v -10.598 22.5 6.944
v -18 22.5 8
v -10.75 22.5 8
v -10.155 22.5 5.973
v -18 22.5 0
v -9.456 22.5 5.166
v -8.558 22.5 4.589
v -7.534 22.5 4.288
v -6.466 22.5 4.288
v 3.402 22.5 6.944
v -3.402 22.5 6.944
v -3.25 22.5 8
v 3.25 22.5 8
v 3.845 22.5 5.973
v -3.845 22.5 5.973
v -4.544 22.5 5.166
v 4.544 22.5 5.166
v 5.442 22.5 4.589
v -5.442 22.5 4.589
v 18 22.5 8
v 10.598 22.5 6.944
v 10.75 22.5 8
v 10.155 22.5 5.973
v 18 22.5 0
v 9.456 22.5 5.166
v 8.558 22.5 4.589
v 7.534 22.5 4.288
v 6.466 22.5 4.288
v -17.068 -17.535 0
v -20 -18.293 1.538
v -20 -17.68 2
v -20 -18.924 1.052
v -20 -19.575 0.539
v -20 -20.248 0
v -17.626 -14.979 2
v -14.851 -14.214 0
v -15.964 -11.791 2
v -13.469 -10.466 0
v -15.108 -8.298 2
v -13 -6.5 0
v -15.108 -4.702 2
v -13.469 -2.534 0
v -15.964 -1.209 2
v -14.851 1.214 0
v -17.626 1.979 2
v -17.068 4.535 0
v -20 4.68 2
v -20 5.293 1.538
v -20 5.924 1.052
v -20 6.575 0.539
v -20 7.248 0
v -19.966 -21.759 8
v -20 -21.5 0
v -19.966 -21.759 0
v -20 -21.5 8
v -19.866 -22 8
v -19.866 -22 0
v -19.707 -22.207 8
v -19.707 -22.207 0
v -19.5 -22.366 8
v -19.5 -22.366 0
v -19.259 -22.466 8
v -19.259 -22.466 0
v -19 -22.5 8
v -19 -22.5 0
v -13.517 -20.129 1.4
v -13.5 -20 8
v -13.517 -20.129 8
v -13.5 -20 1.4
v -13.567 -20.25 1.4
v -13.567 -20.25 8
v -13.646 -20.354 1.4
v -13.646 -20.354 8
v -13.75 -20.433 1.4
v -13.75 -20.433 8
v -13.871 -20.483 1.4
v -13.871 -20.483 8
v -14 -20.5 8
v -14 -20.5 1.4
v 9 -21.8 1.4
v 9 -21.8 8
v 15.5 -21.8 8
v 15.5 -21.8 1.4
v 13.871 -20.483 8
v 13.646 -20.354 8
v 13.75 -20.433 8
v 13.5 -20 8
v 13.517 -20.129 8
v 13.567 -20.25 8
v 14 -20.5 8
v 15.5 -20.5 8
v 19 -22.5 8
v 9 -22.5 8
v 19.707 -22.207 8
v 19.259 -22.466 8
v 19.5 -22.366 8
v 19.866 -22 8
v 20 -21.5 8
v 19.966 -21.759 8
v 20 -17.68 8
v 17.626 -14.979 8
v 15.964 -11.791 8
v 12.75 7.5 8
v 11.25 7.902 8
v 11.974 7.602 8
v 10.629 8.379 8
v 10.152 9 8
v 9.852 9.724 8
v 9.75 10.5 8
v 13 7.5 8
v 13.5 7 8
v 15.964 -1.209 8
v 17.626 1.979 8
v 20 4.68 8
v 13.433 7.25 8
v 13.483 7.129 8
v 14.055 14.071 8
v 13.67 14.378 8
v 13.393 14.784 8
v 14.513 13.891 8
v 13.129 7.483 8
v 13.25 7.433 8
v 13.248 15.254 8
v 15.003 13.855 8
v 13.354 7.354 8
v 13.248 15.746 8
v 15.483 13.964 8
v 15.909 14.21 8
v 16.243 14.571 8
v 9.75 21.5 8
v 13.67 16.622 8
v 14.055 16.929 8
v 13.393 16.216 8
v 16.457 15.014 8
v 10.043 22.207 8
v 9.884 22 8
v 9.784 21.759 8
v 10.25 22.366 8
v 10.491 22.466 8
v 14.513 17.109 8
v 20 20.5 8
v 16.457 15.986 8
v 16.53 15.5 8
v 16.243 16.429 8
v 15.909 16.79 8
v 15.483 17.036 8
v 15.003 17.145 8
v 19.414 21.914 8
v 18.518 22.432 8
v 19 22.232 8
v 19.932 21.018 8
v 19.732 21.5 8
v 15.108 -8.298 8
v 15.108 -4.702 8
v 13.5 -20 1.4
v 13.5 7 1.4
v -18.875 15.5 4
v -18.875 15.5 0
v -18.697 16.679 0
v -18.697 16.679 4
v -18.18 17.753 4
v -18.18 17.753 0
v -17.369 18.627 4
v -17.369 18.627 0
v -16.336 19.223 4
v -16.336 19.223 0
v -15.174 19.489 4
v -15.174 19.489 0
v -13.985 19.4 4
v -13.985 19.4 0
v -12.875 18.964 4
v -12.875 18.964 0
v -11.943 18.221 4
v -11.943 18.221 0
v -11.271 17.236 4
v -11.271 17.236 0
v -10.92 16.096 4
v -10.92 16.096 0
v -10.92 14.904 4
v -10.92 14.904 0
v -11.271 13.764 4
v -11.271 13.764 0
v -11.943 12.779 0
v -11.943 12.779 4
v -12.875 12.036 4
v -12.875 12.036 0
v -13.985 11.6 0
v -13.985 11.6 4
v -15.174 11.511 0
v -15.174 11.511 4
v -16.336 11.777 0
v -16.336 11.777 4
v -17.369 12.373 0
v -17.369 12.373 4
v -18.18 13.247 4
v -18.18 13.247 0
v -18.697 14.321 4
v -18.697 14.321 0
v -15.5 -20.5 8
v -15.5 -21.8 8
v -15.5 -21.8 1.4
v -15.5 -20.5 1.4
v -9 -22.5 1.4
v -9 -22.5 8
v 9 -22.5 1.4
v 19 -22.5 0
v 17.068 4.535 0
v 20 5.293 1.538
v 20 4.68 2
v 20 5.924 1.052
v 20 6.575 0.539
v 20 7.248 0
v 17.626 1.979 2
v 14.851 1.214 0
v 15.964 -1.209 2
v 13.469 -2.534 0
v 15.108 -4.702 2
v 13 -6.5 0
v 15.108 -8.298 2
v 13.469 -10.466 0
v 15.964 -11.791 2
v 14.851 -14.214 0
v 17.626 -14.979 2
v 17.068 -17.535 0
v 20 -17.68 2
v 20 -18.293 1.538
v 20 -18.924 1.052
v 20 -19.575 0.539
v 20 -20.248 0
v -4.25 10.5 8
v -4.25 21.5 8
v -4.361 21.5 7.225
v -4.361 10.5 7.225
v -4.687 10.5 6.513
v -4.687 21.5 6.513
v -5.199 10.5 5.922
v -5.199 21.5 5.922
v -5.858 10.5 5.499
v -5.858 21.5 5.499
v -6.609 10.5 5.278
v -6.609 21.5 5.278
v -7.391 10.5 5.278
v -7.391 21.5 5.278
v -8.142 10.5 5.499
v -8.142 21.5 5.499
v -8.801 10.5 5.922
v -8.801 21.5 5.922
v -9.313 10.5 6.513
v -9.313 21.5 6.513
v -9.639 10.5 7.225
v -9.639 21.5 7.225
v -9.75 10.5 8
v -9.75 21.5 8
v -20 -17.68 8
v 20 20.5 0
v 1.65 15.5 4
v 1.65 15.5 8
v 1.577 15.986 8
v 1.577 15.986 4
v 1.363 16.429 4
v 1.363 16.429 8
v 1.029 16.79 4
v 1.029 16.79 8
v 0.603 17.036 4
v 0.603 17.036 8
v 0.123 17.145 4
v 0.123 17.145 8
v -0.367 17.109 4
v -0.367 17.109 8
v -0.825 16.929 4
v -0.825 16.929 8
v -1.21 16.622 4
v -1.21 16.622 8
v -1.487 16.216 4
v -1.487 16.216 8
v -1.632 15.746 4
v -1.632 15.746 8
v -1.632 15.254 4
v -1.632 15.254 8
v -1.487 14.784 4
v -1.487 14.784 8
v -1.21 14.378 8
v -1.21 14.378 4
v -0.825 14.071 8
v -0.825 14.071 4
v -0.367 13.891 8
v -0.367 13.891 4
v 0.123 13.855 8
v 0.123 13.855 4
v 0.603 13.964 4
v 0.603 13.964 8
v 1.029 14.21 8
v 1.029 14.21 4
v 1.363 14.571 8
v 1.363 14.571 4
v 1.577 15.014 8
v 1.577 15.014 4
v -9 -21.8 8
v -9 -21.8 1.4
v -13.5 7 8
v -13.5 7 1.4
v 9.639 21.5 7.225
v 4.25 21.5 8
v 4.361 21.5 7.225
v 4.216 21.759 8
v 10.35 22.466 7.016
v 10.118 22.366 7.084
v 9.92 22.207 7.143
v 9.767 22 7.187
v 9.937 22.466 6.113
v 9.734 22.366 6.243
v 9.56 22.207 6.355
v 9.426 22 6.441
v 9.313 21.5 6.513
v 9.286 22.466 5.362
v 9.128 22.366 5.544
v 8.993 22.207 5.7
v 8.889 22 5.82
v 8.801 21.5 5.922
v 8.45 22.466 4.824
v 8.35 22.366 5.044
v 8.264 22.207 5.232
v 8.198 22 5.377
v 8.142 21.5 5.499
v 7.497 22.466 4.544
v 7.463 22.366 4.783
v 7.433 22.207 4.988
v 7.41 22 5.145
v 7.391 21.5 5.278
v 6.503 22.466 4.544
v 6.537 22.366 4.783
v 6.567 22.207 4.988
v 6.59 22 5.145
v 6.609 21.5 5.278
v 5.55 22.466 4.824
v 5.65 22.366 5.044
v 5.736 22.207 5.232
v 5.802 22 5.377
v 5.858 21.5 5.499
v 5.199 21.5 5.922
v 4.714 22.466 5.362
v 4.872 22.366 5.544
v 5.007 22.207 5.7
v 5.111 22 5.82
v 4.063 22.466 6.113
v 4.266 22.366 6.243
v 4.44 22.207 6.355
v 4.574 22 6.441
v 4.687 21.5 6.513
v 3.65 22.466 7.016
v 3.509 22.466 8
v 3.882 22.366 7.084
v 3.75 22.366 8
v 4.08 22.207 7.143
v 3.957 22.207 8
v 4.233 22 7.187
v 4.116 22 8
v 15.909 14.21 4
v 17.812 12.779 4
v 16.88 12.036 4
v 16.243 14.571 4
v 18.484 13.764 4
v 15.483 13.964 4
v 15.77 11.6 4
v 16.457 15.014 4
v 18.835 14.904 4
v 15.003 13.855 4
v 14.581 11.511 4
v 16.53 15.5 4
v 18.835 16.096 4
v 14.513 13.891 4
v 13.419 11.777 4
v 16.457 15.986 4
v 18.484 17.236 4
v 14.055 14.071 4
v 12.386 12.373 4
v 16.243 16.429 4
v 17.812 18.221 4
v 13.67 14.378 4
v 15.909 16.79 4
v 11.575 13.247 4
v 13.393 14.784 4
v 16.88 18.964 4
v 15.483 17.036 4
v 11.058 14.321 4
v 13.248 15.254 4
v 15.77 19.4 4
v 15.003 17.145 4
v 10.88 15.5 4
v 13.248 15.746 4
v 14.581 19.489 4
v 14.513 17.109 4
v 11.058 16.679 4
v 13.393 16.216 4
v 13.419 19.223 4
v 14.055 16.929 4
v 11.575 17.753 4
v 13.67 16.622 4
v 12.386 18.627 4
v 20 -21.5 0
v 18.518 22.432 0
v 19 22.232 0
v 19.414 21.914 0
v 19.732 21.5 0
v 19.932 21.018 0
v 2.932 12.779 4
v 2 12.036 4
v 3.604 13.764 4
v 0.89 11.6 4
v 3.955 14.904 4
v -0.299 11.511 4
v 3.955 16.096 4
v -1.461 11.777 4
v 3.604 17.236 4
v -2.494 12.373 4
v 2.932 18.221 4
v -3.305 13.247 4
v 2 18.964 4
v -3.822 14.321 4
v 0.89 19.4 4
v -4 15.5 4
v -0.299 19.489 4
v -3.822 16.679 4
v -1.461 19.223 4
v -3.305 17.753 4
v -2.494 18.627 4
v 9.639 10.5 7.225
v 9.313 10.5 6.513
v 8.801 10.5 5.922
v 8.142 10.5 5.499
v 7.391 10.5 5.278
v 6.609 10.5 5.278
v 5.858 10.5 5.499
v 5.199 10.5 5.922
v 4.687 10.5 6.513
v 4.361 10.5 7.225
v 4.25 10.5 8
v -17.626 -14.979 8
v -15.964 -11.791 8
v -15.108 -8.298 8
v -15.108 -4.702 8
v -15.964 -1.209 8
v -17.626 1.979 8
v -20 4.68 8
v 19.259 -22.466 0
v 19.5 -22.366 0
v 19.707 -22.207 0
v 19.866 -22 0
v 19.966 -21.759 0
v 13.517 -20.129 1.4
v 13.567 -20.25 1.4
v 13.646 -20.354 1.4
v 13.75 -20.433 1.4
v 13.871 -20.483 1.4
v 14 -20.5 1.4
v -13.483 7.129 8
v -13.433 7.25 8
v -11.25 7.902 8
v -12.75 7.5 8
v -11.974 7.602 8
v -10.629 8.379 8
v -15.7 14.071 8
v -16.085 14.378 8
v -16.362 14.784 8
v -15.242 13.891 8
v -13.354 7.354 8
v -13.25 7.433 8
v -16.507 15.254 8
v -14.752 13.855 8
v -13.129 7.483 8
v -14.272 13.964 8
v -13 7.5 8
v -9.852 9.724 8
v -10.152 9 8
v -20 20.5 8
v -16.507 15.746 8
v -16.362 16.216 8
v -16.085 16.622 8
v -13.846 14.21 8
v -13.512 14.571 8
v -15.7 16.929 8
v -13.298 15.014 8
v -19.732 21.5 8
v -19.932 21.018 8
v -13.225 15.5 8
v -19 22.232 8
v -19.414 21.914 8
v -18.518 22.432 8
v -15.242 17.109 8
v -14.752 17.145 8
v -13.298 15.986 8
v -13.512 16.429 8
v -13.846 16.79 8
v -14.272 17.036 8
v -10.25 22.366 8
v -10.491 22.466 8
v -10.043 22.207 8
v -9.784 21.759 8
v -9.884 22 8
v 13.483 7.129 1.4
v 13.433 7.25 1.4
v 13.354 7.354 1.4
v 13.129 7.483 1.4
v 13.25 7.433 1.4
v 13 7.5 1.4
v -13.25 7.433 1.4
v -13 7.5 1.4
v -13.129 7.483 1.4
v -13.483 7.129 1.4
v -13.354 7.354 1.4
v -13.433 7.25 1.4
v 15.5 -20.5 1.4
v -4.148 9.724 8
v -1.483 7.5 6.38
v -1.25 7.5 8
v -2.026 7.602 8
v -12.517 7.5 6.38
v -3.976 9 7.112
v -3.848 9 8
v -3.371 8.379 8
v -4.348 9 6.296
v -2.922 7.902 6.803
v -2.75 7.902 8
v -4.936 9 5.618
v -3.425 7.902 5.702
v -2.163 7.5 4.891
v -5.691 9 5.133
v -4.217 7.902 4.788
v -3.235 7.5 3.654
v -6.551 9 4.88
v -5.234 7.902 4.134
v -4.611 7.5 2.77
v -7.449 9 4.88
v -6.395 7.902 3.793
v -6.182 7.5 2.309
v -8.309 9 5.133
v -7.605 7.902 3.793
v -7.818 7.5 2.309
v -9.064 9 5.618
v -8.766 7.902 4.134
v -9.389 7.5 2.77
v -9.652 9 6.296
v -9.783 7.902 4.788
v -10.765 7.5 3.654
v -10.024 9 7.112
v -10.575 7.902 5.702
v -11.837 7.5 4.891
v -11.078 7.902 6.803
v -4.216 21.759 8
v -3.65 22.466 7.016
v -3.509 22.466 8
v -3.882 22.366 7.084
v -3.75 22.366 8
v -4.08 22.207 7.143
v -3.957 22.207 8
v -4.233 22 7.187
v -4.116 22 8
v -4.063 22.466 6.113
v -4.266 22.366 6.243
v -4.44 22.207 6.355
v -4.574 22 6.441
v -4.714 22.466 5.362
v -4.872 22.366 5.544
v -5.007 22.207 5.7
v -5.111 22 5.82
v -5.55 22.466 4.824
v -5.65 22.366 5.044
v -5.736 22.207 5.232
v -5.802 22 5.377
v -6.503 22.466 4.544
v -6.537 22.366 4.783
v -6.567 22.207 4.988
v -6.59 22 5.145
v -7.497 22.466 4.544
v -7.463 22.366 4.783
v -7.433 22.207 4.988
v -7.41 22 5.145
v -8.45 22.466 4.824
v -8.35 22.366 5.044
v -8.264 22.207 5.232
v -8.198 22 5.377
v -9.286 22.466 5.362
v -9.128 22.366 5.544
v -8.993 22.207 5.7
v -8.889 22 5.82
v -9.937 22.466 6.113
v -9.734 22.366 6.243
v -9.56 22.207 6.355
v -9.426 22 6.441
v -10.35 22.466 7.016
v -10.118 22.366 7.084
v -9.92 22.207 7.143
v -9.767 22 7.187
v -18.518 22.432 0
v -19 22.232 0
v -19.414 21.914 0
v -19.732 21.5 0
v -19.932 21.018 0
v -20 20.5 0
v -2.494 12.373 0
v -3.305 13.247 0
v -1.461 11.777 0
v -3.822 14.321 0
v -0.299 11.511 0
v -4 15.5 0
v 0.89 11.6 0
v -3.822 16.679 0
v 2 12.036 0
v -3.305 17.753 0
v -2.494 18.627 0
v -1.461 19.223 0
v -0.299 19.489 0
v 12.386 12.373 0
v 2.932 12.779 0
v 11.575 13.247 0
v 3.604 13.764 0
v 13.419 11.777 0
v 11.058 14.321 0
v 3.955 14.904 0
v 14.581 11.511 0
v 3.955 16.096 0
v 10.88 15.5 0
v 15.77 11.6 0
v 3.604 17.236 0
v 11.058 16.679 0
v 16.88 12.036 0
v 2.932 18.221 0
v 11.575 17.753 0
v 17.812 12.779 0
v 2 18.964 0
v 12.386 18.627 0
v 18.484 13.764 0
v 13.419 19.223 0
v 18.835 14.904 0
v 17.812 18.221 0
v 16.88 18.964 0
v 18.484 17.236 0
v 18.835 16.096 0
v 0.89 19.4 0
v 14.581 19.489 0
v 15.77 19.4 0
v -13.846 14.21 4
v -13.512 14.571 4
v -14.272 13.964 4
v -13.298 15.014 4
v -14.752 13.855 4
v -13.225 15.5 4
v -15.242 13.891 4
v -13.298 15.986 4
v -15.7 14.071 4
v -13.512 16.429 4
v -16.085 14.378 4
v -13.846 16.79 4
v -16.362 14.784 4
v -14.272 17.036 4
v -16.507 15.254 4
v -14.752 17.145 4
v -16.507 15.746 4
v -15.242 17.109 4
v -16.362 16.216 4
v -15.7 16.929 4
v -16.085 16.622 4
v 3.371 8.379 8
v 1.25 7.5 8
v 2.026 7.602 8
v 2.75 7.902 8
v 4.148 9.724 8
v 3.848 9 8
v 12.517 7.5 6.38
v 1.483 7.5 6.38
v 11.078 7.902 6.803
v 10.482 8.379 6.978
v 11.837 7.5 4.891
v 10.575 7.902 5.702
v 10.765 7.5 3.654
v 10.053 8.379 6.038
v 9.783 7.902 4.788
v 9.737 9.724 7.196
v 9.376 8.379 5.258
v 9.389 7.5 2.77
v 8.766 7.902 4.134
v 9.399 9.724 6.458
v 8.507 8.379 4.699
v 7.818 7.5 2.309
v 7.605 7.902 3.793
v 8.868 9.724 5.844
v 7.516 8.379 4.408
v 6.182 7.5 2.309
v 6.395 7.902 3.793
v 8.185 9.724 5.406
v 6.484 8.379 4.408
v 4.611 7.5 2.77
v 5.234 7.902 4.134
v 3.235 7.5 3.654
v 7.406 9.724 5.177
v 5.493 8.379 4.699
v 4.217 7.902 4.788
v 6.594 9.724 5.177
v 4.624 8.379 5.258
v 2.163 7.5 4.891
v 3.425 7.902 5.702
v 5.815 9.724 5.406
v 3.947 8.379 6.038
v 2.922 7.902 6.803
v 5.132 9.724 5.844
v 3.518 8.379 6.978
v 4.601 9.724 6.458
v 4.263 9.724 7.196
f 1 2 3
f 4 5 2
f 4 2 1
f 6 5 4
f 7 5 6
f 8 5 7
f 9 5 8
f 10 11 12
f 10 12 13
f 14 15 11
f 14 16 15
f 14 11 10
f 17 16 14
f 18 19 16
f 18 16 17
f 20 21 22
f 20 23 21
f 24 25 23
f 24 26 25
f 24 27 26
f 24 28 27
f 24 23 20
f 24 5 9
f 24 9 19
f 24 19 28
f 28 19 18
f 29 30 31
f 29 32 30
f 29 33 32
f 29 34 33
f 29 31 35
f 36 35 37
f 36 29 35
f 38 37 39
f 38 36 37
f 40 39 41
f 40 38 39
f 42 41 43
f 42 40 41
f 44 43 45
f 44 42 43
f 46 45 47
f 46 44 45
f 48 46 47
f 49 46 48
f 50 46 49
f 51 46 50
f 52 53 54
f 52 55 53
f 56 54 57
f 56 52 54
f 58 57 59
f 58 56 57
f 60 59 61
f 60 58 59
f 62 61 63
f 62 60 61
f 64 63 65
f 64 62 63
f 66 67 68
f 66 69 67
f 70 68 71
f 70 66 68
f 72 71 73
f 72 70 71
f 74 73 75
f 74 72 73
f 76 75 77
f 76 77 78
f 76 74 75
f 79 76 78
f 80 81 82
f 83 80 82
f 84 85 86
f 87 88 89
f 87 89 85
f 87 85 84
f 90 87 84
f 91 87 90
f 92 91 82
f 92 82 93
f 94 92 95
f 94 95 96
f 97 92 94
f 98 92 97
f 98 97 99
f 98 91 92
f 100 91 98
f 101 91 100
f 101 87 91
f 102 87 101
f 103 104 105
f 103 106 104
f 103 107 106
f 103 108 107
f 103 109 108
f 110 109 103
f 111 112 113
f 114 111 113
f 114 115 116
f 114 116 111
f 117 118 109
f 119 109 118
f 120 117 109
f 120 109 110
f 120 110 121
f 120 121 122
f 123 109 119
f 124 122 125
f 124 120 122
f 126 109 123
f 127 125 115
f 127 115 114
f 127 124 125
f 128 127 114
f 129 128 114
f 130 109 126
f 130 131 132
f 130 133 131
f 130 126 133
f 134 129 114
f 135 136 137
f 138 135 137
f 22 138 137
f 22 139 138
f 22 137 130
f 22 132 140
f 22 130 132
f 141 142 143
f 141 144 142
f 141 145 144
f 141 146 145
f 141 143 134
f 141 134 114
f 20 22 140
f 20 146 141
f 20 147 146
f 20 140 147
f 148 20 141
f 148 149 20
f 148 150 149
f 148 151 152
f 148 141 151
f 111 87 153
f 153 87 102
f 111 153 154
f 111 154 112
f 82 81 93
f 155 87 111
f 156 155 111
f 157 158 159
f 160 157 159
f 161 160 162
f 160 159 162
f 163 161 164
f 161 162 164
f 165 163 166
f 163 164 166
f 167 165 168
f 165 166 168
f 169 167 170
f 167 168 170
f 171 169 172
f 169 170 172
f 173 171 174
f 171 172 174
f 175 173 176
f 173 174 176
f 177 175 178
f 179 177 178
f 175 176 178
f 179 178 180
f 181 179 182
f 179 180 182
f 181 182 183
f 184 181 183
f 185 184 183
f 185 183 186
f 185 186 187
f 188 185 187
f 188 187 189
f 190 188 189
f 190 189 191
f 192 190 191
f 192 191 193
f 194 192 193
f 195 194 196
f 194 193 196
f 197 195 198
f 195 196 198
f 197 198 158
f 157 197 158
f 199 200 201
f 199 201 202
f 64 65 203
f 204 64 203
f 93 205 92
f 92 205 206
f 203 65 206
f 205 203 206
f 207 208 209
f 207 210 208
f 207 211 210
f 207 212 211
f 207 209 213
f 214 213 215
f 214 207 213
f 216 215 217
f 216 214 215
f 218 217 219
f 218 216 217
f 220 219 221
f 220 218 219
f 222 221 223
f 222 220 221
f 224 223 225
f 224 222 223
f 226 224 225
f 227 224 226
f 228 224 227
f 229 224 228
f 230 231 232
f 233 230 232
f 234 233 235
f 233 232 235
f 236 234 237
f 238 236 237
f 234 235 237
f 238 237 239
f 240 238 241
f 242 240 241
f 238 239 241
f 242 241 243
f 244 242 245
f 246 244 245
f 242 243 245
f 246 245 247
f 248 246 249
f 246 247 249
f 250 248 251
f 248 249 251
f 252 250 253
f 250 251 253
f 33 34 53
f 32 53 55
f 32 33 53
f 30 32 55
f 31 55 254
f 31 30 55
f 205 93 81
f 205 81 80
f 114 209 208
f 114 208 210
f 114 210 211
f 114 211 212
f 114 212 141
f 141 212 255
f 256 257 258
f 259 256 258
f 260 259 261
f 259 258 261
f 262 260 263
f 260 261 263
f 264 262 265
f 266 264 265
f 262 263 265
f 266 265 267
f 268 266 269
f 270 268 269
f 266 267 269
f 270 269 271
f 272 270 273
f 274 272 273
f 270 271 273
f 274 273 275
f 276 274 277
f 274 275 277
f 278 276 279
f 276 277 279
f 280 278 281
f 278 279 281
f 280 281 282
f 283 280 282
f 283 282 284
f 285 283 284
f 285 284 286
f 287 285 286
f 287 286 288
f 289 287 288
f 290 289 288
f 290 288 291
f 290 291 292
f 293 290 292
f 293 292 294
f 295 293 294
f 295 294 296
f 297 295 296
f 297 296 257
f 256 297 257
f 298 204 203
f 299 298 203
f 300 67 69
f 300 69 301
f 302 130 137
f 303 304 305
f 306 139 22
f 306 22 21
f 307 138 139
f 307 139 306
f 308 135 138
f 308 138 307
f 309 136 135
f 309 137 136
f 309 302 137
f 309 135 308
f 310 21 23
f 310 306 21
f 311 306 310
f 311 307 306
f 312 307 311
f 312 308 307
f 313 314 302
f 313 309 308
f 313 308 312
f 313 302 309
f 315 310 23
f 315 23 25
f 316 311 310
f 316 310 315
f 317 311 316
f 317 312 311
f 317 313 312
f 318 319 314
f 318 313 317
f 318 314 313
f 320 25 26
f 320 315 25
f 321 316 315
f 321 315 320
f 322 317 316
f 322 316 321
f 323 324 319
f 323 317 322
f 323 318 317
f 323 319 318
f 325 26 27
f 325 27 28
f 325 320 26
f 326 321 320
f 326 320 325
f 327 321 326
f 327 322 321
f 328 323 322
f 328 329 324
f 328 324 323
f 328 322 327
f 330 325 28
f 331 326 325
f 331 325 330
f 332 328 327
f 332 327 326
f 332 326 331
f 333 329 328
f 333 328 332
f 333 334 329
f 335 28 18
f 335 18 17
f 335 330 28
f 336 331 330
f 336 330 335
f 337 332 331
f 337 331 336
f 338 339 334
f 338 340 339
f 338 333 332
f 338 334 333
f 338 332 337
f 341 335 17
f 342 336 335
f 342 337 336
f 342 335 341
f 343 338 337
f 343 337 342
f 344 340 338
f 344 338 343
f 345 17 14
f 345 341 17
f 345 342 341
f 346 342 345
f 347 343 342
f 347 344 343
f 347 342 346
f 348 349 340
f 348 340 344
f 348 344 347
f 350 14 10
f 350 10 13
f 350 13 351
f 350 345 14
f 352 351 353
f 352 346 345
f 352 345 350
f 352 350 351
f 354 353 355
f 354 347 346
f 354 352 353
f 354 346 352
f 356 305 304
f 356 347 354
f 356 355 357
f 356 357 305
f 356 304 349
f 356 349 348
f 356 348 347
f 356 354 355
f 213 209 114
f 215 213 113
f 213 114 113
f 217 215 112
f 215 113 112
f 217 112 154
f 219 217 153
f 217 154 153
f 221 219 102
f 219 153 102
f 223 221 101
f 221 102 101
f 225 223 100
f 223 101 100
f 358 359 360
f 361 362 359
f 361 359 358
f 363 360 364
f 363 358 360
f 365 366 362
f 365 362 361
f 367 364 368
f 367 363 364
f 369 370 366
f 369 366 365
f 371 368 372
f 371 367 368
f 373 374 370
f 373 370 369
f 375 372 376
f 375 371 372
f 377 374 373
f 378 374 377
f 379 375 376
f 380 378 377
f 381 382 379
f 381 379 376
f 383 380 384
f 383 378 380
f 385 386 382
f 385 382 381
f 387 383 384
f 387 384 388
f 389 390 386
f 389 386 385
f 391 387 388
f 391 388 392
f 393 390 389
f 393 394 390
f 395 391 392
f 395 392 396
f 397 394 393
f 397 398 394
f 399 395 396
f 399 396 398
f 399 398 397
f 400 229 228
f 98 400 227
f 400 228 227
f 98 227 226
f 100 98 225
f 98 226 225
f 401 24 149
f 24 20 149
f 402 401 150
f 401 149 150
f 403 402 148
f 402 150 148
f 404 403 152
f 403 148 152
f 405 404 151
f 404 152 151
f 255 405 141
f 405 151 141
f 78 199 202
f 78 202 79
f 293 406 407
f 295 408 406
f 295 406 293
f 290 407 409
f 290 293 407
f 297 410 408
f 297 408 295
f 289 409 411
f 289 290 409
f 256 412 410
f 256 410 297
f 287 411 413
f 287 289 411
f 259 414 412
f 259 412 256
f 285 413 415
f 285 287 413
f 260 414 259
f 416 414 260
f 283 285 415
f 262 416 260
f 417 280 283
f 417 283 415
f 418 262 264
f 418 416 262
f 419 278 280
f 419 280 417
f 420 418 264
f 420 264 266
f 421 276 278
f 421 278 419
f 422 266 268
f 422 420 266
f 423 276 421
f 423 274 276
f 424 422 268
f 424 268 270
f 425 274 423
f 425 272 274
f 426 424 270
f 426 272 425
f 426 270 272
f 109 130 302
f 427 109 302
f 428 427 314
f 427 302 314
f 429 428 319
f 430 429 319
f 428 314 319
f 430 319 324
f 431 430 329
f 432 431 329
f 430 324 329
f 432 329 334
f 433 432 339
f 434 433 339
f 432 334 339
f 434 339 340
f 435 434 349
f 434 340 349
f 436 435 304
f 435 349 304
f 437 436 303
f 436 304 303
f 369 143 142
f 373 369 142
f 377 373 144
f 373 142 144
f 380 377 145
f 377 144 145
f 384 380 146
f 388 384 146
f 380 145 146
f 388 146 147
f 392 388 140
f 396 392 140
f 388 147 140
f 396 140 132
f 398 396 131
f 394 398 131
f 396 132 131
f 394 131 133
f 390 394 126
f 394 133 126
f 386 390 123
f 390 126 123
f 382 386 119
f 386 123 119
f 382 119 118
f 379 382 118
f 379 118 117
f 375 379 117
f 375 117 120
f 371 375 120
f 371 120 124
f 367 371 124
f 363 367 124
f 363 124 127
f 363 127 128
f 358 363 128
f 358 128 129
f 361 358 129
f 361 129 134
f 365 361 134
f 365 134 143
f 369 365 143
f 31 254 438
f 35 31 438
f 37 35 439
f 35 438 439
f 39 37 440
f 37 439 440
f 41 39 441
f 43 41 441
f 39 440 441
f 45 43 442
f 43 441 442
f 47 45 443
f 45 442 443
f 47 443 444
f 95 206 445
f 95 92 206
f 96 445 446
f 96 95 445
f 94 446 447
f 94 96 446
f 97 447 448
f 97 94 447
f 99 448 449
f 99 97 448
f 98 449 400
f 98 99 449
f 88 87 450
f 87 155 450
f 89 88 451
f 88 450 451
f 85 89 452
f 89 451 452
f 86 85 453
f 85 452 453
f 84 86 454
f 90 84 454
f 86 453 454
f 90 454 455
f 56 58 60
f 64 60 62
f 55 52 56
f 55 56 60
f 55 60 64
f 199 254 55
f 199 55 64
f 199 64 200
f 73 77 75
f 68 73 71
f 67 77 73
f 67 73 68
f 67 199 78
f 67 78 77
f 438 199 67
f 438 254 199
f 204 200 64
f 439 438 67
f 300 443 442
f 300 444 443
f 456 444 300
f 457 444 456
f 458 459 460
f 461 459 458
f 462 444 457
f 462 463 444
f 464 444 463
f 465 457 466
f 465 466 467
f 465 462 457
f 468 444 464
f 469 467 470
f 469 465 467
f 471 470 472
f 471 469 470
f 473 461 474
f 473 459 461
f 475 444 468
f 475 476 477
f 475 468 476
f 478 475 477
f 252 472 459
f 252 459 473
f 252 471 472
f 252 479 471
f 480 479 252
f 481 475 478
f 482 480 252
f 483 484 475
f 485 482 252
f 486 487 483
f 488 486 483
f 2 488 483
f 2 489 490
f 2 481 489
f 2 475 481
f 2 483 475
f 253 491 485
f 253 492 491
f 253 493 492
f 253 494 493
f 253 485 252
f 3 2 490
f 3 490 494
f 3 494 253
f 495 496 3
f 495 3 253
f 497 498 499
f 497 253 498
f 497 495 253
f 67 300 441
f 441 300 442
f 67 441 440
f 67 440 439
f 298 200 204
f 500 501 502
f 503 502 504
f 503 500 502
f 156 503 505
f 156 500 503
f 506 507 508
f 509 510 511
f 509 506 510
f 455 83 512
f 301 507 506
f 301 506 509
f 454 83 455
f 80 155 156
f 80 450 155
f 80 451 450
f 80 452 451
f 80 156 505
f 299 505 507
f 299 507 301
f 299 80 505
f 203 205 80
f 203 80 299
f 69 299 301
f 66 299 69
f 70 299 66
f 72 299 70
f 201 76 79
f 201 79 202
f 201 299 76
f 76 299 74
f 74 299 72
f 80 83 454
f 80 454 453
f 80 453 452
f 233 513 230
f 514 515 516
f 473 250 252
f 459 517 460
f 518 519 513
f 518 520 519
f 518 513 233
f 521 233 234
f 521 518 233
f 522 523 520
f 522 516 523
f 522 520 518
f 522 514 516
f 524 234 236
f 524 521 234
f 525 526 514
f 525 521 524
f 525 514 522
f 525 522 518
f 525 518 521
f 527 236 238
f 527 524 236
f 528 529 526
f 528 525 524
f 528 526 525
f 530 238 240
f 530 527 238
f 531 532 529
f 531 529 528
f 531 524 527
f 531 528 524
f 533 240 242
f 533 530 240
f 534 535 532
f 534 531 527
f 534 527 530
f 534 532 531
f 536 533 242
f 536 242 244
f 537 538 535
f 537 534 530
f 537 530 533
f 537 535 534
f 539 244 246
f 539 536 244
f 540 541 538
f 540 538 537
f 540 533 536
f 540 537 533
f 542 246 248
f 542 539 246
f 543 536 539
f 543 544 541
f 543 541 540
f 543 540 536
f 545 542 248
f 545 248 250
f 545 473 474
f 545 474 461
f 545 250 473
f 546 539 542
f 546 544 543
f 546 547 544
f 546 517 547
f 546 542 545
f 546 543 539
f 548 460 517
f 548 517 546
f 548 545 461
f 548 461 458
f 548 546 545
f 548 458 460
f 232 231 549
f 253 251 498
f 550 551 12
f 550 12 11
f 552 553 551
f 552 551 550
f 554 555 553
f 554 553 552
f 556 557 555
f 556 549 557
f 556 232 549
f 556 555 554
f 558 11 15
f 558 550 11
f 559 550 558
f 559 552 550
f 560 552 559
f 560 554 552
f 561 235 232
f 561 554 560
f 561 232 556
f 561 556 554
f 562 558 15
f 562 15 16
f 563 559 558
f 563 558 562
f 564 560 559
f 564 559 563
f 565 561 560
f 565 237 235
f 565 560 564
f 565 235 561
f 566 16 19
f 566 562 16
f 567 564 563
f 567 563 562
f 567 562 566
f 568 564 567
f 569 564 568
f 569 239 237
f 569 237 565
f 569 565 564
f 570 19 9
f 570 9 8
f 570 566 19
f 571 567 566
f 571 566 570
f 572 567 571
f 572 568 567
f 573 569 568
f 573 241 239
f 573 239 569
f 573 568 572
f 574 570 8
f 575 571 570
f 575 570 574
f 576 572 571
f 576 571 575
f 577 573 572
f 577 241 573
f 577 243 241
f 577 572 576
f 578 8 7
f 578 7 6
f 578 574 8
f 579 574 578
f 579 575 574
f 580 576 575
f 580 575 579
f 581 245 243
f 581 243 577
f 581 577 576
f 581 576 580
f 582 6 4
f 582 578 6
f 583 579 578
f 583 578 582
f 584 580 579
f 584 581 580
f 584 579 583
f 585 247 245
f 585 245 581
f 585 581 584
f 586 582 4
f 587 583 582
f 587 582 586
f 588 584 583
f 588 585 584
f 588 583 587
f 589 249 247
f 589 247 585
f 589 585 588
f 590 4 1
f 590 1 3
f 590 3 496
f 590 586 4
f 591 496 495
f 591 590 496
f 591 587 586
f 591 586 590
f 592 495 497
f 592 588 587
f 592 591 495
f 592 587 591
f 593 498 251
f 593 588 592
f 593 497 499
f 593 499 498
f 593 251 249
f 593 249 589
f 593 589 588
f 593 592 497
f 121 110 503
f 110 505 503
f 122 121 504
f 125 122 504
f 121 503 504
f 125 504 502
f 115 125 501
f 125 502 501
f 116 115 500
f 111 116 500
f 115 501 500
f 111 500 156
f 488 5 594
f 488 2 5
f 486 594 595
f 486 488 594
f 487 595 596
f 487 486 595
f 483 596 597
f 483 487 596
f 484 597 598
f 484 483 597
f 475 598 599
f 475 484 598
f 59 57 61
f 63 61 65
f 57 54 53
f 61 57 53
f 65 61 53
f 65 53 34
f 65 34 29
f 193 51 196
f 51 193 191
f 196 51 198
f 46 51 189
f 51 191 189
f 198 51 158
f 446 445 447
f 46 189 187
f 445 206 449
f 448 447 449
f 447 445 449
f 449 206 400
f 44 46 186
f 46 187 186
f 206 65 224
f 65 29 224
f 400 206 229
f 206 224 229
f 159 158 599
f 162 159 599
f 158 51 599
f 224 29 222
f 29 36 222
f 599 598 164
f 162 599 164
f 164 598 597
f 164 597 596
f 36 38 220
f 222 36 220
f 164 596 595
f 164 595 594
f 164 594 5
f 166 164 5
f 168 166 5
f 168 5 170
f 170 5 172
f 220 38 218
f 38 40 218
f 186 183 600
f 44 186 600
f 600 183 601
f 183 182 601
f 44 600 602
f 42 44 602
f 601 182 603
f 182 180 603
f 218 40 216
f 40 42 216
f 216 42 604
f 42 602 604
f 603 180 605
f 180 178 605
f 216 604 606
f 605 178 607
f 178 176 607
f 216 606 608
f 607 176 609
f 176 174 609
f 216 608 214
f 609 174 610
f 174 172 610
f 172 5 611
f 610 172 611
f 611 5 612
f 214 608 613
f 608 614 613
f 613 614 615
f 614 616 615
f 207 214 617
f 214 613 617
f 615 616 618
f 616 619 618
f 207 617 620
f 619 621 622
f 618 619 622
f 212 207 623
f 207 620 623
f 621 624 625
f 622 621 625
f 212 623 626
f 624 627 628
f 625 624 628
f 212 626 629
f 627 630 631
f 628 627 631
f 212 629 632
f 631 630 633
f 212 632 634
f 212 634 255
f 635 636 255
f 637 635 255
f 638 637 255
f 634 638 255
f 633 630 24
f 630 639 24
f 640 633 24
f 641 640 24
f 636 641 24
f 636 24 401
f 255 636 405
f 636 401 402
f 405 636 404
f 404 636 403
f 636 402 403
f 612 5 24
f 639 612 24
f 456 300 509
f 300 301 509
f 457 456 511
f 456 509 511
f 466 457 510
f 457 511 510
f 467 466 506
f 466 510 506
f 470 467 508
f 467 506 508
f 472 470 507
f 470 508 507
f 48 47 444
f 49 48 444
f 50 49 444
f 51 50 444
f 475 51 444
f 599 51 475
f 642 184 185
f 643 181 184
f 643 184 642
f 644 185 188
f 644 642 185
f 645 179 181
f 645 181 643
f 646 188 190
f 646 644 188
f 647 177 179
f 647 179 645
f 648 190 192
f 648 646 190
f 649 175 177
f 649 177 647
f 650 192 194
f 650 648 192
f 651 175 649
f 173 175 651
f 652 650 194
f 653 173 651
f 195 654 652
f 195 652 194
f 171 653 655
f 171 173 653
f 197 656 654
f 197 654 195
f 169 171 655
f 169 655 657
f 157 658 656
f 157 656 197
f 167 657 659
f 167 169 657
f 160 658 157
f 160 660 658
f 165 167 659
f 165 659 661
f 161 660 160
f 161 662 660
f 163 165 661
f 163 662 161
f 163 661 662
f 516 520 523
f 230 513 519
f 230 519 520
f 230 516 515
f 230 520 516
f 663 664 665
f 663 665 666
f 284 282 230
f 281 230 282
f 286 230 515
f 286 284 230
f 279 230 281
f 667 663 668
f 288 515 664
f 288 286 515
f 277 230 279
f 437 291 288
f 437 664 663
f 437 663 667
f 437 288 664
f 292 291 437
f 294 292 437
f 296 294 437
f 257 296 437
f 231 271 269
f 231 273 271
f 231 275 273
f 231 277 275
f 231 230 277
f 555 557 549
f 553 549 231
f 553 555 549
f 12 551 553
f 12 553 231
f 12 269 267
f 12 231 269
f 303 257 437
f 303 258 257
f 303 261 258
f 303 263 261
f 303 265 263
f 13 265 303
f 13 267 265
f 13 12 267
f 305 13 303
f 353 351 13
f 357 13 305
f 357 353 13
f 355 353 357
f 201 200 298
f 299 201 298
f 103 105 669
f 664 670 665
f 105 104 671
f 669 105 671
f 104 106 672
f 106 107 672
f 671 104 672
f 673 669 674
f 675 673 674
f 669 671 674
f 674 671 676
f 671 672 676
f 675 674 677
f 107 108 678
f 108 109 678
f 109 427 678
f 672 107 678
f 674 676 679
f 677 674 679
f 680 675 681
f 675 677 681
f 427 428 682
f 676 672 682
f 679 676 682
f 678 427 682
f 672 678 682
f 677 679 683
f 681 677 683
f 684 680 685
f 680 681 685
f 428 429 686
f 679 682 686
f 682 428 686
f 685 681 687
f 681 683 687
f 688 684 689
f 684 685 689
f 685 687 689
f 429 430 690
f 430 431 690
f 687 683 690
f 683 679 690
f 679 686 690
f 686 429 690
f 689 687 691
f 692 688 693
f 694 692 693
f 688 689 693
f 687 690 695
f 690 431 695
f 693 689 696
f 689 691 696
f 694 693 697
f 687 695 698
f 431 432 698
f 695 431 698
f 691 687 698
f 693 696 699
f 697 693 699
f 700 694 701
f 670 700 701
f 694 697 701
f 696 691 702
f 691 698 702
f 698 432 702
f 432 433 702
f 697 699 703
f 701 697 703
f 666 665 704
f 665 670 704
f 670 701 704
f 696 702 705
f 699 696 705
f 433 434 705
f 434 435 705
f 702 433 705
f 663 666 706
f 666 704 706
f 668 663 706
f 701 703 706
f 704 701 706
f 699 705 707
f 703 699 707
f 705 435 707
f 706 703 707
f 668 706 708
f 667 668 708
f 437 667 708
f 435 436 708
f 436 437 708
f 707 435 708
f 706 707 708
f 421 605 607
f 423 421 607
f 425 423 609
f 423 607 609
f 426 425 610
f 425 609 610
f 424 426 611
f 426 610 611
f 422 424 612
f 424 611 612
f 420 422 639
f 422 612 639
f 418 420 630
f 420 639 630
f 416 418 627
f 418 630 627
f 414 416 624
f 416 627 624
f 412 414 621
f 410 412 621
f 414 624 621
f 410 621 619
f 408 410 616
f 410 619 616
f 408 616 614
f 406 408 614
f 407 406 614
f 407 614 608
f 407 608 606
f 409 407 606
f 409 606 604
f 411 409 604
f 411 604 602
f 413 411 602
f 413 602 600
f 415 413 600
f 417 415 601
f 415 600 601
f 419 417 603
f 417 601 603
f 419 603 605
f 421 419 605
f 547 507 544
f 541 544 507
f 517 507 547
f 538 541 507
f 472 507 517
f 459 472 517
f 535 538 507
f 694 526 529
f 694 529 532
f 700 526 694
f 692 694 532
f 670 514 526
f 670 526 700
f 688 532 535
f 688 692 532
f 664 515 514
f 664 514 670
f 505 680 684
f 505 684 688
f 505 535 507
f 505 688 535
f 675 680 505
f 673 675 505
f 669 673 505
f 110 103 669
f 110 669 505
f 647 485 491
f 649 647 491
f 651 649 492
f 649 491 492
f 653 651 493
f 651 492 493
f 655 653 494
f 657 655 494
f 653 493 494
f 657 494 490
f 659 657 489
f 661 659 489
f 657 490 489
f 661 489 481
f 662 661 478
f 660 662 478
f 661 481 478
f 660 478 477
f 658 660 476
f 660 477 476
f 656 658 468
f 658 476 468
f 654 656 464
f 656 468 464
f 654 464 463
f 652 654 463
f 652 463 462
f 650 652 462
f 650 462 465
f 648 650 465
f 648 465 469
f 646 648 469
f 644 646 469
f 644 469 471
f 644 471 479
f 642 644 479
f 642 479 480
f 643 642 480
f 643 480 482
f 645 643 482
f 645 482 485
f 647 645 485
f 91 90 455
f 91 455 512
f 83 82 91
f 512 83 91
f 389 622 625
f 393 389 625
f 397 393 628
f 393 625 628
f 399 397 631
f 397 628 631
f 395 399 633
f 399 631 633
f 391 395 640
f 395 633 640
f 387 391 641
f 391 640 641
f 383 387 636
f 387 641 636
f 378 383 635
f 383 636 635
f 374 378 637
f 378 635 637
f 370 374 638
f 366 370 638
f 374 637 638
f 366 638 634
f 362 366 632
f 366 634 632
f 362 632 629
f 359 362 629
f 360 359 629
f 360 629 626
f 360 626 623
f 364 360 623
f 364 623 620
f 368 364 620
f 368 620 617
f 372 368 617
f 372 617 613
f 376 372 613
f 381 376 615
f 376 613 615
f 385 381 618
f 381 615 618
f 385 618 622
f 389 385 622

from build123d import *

# Parameters (mm, degrees)
CROQUIS1_W              = 40
CROQUIS1_H              = 45
SALIENTE_EXTRUIR1_DEPTH = 8
CROQUIS2_W              = 31
CROQUIS2_H              = 1.3
CORTAR_EXTRUIR1_DEPTH   = 6.6
CROQUIS3_R              = 15
CORTAR_EXTRUIR2_DEPTH   = 10
CHAFL_N1_SIZE           = 2
CROQUIS4_W              = 27
CROQUIS4_H              = 28
CORTAR_EXTRUIR3_DEPTH   = 6.6
CROQUIS6_R              = 2.75
CORTAR_EXTRUIR4_DEPTH   = 16.6
CROQUIS7_R              = 1.65
CORTAR_EXTRUIR5_DEPTH   = 16.6
CROQUIS8_R              = 4
CORTAR_EXTRUIR6_DEPTH   = 4
CROQUIS9_W              = 18
CROQUIS9_H              = 6.6
CORTAR_EXTRUIR7_DEPTH   = 4
REDONDEO1_R             = 1
REDONDEO2_R             = 2
REDONDEO3_R             = 1
REDONDEO4_R             = 3
REDONDEO5_R             = 0.5
REDONDEO6_R             = 0.5


with BuildPart() as part:
    # Croquis1 → Saliente-Extruir1 (new body)
    with BuildSketch(Plane.XY):
        Rectangle(CROQUIS1_W, CROQUIS1_H)
    extrude(amount=SALIENTE_EXTRUIR1_DEPTH)

    # Croquis2 → Cortar-Extruir1 (cut)
    with BuildSketch(Plane.XY.offset(8)):
        with Locations((0, -21.15)):
            Rectangle(CROQUIS2_W, CROQUIS2_H)
    extrude(amount=-CORTAR_EXTRUIR1_DEPTH, mode=Mode.SUBTRACT)

    # Croquis3 → Cortar-Extruir2 (cut)
    with BuildSketch(Plane.XY.offset(8)):
        with Locations((-30, -6.5)):
            Circle(CROQUIS3_R)
        with Locations((30, -6.5)):
            Circle(CROQUIS3_R)
    extrude(amount=-CORTAR_EXTRUIR2_DEPTH, mode=Mode.SUBTRACT)

    # Chaflán1
    chafl_n1_edges = [part.edges().sort_by_distance(p)[0] for p in [
        (-15, -6.5, 0),
        (15, -6.5, 0),
    ]]
    chamfer(chafl_n1_edges, length=CHAFL_N1_SIZE)

    # Croquis4 → Cortar-Extruir3 (cut)
    with BuildSketch(Plane.XY.offset(8)):
        with Locations((0, -6.5)):
            Rectangle(CROQUIS4_W, CROQUIS4_H)
    extrude(amount=-CORTAR_EXTRUIR3_DEPTH, mode=Mode.SUBTRACT)

    # Croquis6 → Cortar-Extruir4 (cut)
    with BuildSketch(Plane(origin=(0, 22.5, 0), x_dir=(1, 0, 0), z_dir=(0, 1, 0))):
        with Locations((7, -8)):
            Circle(CROQUIS6_R)
        with Locations((-7, -8)):
            Circle(CROQUIS6_R)
    extrude(amount=-CORTAR_EXTRUIR4_DEPTH, mode=Mode.SUBTRACT)

    # Croquis7 → Cortar-Extruir5 (cut)
    with BuildSketch(Plane.XY.offset(8)):
        with Locations((0, 15.5)):
            Circle(CROQUIS7_R)
        with Locations((14.88, 15.5)):
            Circle(CROQUIS7_R)
        with Locations((-14.875, 15.5)):
            Circle(CROQUIS7_R)
    extrude(amount=-CORTAR_EXTRUIR5_DEPTH, mode=Mode.SUBTRACT)

    # Croquis8 → Cortar-Extruir6 (cut)
    with BuildSketch(Plane(origin=(0, 0, 0), x_dir=(-1, 0, 0), z_dir=(0, 0, -1))):
        with Locations((14.875, 15.5)):
            Circle(CROQUIS8_R)
        with Locations((0, 15.5)):
            Circle(CROQUIS8_R)
        with Locations((-14.88, 15.5)):
            Circle(CROQUIS8_R)
    extrude(amount=-CORTAR_EXTRUIR6_DEPTH, mode=Mode.SUBTRACT)

    # Croquis9 → Cortar-Extruir7 (cut)
    with BuildSketch(Plane(origin=(0, -22.5, 0), x_dir=(-1, 0, 0), z_dir=(0, -1, 0))):
        with Locations((0, -4.7)):
            Rectangle(CROQUIS9_W, CROQUIS9_H)
    extrude(amount=-CORTAR_EXTRUIR7_DEPTH, mode=Mode.SUBTRACT)

    # Redondeo1
    redondeo1_edges = [part.edges().sort_by_distance(p)[0] for p in [
        (7, 22.5, 5.25),
        (-7, 22.5, 5.25),
    ]]
    fillet(redondeo1_edges, radius=REDONDEO1_R)

    # Redondeo2
    redondeo2_edges = [part.edges().sort_by_distance(p)[0] for p in [
        (-20, 22.5, 4),
        (20, 22.5, 4),
    ]]
    fillet(redondeo2_edges, radius=REDONDEO2_R)

    # Redondeo3
    redondeo3_edges = [part.edges().sort_by_distance(p)[0] for p in [
        (20, -22.5, 4),
        (-20, -22.5, 4),
    ]]
    fillet(redondeo3_edges, radius=REDONDEO3_R)

    # Redondeo4
    redondeo4_edges = [part.edges().sort_by_distance(p)[0] for p in [
        (7, 7.5, 5.25),
        (-7, 7.5, 5.25),
    ]]
    fillet(redondeo4_edges, radius=REDONDEO4_R)

    # Redondeo5
    redondeo5_edges = [part.edges().sort_by_distance(p)[0] for p in [
        (13.5, -20.5, 4.7),
        (-13.5, -20.5, 4.7),
    ]]
    fillet(redondeo5_edges, radius=REDONDEO5_R)

    # Redondeo6
    redondeo6_edges = [part.edges().sort_by_distance(p)[0] for p in [
        (-13.5, 7.5, 4.7),
        (13.5, 7.5, 4.7),
    ]]
    fillet(redondeo6_edges, radius=REDONDEO6_R)


solid = part.part
